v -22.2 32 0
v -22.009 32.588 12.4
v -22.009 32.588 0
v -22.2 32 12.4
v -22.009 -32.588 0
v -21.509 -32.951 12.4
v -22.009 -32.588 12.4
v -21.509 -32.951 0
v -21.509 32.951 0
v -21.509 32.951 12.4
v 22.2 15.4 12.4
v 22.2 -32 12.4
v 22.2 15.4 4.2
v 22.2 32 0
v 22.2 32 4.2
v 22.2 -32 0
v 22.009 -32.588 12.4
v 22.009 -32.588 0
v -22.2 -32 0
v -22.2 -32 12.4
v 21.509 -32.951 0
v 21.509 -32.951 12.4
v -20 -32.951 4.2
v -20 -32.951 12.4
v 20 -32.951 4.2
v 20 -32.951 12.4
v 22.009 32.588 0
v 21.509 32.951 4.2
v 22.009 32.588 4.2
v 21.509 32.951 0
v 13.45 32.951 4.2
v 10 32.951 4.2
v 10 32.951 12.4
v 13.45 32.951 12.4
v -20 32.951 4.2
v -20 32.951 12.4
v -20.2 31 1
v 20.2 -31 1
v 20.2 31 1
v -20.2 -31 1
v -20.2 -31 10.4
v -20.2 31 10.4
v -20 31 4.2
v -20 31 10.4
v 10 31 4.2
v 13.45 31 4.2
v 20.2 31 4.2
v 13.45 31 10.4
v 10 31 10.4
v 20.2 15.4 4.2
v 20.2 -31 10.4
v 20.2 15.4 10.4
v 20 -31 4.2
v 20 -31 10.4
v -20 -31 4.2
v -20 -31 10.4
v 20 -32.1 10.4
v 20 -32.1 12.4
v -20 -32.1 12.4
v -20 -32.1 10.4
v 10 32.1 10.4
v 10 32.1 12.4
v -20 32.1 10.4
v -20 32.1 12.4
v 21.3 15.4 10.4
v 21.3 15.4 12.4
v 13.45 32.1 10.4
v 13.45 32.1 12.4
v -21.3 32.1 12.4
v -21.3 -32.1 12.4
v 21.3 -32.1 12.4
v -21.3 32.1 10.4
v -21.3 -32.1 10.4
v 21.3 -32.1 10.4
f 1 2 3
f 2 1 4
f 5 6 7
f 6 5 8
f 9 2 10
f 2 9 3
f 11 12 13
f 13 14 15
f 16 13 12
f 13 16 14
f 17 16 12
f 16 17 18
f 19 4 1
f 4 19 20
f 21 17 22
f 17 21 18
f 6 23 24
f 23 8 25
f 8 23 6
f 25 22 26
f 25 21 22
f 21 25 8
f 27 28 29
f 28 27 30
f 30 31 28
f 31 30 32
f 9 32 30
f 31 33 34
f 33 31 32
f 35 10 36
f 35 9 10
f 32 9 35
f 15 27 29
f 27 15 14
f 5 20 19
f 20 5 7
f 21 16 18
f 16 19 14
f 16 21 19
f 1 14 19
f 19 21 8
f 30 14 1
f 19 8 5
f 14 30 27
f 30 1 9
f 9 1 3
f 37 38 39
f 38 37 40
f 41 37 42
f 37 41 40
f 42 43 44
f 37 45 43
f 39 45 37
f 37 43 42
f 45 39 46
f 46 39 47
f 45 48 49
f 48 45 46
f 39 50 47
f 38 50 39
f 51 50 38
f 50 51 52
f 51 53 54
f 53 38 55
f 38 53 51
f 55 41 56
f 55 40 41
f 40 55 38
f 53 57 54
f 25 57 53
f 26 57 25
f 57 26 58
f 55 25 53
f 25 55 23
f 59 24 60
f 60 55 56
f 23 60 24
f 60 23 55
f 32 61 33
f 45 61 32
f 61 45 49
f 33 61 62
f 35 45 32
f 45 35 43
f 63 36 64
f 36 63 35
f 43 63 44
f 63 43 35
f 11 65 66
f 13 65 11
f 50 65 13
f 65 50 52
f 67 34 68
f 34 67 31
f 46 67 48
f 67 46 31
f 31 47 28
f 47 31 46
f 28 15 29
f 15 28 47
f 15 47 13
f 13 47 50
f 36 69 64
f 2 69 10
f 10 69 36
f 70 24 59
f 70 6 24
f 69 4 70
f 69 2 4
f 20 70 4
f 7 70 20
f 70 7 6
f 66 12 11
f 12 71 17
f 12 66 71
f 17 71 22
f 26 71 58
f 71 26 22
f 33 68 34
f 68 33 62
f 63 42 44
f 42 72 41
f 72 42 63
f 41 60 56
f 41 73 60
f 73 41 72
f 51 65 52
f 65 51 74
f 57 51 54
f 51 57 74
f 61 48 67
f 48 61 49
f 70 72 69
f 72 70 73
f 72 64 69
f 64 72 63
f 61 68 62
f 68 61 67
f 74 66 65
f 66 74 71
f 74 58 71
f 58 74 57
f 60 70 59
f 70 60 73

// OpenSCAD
// BOX
// FLAT BOTTOM
// ROUNDED CORNERS
// CALCULATED BASED ON SIZE OF CONTENT


$fn=10;

// dimensions
OBJECT = ([40, 60, 20]);

// parameters for the box
WALL = 2;
PADDING_X = 0.2;
PADDING_Y = 1;
PADDING_Z = 0.2;
LID_HEIGHT = 10;
RIM_HEIGHT = 2;
RIM_WIDTH = 1;
RIM_SPACING = 0.2;


// calculated dimensions

CORNER_SIZE = WALL/2;
WALL_SIZE = WALL/2;

INNER_BOX = ([OBJECT[0]+ 2 * PADDING_X,
              OBJECT[1]+ 2 * PADDING_Y,
              OBJECT[2]+ 2 * PADDING_Z]);
              
              
OUTER_BOX = ([OBJECT[0] + 2 * (PADDING_X + WALL_SIZE),
              OBJECT[1] + 2 * (PADDING_Y + WALL_SIZE),
              OBJECT[2] + 2 * (PADDING_Z + WALL_SIZE)]);

//box();
base();
//openings();
//rotate([180,0,0]) cover();
//outer_box();
//cutout_base();


module openings(){
    //motor plugs
    translate([- OBJECT[0]/2,
               - OBJECT[1]/2 - (PADDING_Y + WALL),
               PADDING_Z + WALL_SIZE + 3]){
        cube([OBJECT[0],
              5.75 + PADDING_Y + WALL,
              OBJECT[2] + PADDING_Z + WALL_SIZE - 3]);
    }

    //sensor plugs
    translate([- OBJECT[0]/2,
               OBJECT[1]/2 - (5.75),
               PADDING_Z + WALL_SIZE + 3]){
        cube([30,
              5.75 + PADDING_Y + WALL,
              OBJECT[2] + PADDING_Z + WALL_SIZE - 3]);
    }

    //power and serial plugs
    translate([OBJECT[0]/2 + PADDING_X + WALL,
               OBJECT[1]/2 + PADDING_Y + WALL - 17.6,
               PADDING_Z + WALL_SIZE + 3]){
        rotate([0,0,90]){
            cube([17.6,
                  5.75 + PADDING_Y + WALL,
                  OBJECT[2] + PADDING_Z + WALL_SIZE - 3]);
        }
    }
    
    //arduino serial pins
    translate([ - (OBJECT[0]/2 + PADDING_X + WALL),
               - OBJECT[1]/2 + 33,
               OBJECT[2] + PADDING_Y + WALL_SIZE]){
        cube([8,18,PADDING_Z + WALL_SIZE]);
    }
}



module rim_base(){
    translate([0,0,OUTER_BOX[2] - LID_HEIGHT - RIM_HEIGHT])
    linear_extrude(RIM_HEIGHT){
        square([OBJECT[0] + 2 * (PADDING_X + RIM_WIDTH) + RIM_SPACING,
                OBJECT[1] + 2 * (PADDING_Y + RIM_WIDTH) + RIM_SPACING],
                center = true);
    }
}

module rim_cover(){
        translate([0,0, OUTER_BOX[2] - LID_HEIGHT - RIM_HEIGHT]){
        difference(){
            linear_extrude(RIM_HEIGHT){
                square([INNER_BOX[0] + 2 * RIM_WIDTH - RIM_SPACING,
                        INNER_BOX[1] + 2 * RIM_WIDTH - RIM_SPACING],
                        center = true);
            }
            linear_extrude(RIM_HEIGHT){
                square([INNER_BOX[0],
                        INNER_BOX[1]],
                        center = true);                    
            }
            }
        }
}

module box(){
    difference(){
        outer_box();
        inner_box();
    }
    openings();
}

module outer_box(){
    linear_extrude(OUTER_BOX[2]) {
        minkowski(){
            square([OUTER_BOX[0], 
                    OUTER_BOX[1]],
                    center = true);
            circle(CORNER_SIZE);
        }
    }
}

module inner_box(){
    translate([0,0, WALL_SIZE]){
        linear_extrude(INNER_BOX[2]) {
            square([INNER_BOX[0],
                    INNER_BOX[1]],
                    center = true);
        }
    }
}

module base(){
    difference(){
        difference(){
            difference(){
                box();
                translate([0,0,OUTER_BOX[2] - LID_HEIGHT]){
                    resize([0,0, LID_HEIGHT]){
                        outer_box();
                    }
                }
            }
            rim_base();
        }
        openings();
    }
}

module cover(){
    difference(){
        union(){
            difference(){
                box();
                resize([0,0, OUTER_BOX[2] - LID_HEIGHT]){
                    outer_box();
                }
            }
        rim_cover();
        }
        openings();
    }
}
